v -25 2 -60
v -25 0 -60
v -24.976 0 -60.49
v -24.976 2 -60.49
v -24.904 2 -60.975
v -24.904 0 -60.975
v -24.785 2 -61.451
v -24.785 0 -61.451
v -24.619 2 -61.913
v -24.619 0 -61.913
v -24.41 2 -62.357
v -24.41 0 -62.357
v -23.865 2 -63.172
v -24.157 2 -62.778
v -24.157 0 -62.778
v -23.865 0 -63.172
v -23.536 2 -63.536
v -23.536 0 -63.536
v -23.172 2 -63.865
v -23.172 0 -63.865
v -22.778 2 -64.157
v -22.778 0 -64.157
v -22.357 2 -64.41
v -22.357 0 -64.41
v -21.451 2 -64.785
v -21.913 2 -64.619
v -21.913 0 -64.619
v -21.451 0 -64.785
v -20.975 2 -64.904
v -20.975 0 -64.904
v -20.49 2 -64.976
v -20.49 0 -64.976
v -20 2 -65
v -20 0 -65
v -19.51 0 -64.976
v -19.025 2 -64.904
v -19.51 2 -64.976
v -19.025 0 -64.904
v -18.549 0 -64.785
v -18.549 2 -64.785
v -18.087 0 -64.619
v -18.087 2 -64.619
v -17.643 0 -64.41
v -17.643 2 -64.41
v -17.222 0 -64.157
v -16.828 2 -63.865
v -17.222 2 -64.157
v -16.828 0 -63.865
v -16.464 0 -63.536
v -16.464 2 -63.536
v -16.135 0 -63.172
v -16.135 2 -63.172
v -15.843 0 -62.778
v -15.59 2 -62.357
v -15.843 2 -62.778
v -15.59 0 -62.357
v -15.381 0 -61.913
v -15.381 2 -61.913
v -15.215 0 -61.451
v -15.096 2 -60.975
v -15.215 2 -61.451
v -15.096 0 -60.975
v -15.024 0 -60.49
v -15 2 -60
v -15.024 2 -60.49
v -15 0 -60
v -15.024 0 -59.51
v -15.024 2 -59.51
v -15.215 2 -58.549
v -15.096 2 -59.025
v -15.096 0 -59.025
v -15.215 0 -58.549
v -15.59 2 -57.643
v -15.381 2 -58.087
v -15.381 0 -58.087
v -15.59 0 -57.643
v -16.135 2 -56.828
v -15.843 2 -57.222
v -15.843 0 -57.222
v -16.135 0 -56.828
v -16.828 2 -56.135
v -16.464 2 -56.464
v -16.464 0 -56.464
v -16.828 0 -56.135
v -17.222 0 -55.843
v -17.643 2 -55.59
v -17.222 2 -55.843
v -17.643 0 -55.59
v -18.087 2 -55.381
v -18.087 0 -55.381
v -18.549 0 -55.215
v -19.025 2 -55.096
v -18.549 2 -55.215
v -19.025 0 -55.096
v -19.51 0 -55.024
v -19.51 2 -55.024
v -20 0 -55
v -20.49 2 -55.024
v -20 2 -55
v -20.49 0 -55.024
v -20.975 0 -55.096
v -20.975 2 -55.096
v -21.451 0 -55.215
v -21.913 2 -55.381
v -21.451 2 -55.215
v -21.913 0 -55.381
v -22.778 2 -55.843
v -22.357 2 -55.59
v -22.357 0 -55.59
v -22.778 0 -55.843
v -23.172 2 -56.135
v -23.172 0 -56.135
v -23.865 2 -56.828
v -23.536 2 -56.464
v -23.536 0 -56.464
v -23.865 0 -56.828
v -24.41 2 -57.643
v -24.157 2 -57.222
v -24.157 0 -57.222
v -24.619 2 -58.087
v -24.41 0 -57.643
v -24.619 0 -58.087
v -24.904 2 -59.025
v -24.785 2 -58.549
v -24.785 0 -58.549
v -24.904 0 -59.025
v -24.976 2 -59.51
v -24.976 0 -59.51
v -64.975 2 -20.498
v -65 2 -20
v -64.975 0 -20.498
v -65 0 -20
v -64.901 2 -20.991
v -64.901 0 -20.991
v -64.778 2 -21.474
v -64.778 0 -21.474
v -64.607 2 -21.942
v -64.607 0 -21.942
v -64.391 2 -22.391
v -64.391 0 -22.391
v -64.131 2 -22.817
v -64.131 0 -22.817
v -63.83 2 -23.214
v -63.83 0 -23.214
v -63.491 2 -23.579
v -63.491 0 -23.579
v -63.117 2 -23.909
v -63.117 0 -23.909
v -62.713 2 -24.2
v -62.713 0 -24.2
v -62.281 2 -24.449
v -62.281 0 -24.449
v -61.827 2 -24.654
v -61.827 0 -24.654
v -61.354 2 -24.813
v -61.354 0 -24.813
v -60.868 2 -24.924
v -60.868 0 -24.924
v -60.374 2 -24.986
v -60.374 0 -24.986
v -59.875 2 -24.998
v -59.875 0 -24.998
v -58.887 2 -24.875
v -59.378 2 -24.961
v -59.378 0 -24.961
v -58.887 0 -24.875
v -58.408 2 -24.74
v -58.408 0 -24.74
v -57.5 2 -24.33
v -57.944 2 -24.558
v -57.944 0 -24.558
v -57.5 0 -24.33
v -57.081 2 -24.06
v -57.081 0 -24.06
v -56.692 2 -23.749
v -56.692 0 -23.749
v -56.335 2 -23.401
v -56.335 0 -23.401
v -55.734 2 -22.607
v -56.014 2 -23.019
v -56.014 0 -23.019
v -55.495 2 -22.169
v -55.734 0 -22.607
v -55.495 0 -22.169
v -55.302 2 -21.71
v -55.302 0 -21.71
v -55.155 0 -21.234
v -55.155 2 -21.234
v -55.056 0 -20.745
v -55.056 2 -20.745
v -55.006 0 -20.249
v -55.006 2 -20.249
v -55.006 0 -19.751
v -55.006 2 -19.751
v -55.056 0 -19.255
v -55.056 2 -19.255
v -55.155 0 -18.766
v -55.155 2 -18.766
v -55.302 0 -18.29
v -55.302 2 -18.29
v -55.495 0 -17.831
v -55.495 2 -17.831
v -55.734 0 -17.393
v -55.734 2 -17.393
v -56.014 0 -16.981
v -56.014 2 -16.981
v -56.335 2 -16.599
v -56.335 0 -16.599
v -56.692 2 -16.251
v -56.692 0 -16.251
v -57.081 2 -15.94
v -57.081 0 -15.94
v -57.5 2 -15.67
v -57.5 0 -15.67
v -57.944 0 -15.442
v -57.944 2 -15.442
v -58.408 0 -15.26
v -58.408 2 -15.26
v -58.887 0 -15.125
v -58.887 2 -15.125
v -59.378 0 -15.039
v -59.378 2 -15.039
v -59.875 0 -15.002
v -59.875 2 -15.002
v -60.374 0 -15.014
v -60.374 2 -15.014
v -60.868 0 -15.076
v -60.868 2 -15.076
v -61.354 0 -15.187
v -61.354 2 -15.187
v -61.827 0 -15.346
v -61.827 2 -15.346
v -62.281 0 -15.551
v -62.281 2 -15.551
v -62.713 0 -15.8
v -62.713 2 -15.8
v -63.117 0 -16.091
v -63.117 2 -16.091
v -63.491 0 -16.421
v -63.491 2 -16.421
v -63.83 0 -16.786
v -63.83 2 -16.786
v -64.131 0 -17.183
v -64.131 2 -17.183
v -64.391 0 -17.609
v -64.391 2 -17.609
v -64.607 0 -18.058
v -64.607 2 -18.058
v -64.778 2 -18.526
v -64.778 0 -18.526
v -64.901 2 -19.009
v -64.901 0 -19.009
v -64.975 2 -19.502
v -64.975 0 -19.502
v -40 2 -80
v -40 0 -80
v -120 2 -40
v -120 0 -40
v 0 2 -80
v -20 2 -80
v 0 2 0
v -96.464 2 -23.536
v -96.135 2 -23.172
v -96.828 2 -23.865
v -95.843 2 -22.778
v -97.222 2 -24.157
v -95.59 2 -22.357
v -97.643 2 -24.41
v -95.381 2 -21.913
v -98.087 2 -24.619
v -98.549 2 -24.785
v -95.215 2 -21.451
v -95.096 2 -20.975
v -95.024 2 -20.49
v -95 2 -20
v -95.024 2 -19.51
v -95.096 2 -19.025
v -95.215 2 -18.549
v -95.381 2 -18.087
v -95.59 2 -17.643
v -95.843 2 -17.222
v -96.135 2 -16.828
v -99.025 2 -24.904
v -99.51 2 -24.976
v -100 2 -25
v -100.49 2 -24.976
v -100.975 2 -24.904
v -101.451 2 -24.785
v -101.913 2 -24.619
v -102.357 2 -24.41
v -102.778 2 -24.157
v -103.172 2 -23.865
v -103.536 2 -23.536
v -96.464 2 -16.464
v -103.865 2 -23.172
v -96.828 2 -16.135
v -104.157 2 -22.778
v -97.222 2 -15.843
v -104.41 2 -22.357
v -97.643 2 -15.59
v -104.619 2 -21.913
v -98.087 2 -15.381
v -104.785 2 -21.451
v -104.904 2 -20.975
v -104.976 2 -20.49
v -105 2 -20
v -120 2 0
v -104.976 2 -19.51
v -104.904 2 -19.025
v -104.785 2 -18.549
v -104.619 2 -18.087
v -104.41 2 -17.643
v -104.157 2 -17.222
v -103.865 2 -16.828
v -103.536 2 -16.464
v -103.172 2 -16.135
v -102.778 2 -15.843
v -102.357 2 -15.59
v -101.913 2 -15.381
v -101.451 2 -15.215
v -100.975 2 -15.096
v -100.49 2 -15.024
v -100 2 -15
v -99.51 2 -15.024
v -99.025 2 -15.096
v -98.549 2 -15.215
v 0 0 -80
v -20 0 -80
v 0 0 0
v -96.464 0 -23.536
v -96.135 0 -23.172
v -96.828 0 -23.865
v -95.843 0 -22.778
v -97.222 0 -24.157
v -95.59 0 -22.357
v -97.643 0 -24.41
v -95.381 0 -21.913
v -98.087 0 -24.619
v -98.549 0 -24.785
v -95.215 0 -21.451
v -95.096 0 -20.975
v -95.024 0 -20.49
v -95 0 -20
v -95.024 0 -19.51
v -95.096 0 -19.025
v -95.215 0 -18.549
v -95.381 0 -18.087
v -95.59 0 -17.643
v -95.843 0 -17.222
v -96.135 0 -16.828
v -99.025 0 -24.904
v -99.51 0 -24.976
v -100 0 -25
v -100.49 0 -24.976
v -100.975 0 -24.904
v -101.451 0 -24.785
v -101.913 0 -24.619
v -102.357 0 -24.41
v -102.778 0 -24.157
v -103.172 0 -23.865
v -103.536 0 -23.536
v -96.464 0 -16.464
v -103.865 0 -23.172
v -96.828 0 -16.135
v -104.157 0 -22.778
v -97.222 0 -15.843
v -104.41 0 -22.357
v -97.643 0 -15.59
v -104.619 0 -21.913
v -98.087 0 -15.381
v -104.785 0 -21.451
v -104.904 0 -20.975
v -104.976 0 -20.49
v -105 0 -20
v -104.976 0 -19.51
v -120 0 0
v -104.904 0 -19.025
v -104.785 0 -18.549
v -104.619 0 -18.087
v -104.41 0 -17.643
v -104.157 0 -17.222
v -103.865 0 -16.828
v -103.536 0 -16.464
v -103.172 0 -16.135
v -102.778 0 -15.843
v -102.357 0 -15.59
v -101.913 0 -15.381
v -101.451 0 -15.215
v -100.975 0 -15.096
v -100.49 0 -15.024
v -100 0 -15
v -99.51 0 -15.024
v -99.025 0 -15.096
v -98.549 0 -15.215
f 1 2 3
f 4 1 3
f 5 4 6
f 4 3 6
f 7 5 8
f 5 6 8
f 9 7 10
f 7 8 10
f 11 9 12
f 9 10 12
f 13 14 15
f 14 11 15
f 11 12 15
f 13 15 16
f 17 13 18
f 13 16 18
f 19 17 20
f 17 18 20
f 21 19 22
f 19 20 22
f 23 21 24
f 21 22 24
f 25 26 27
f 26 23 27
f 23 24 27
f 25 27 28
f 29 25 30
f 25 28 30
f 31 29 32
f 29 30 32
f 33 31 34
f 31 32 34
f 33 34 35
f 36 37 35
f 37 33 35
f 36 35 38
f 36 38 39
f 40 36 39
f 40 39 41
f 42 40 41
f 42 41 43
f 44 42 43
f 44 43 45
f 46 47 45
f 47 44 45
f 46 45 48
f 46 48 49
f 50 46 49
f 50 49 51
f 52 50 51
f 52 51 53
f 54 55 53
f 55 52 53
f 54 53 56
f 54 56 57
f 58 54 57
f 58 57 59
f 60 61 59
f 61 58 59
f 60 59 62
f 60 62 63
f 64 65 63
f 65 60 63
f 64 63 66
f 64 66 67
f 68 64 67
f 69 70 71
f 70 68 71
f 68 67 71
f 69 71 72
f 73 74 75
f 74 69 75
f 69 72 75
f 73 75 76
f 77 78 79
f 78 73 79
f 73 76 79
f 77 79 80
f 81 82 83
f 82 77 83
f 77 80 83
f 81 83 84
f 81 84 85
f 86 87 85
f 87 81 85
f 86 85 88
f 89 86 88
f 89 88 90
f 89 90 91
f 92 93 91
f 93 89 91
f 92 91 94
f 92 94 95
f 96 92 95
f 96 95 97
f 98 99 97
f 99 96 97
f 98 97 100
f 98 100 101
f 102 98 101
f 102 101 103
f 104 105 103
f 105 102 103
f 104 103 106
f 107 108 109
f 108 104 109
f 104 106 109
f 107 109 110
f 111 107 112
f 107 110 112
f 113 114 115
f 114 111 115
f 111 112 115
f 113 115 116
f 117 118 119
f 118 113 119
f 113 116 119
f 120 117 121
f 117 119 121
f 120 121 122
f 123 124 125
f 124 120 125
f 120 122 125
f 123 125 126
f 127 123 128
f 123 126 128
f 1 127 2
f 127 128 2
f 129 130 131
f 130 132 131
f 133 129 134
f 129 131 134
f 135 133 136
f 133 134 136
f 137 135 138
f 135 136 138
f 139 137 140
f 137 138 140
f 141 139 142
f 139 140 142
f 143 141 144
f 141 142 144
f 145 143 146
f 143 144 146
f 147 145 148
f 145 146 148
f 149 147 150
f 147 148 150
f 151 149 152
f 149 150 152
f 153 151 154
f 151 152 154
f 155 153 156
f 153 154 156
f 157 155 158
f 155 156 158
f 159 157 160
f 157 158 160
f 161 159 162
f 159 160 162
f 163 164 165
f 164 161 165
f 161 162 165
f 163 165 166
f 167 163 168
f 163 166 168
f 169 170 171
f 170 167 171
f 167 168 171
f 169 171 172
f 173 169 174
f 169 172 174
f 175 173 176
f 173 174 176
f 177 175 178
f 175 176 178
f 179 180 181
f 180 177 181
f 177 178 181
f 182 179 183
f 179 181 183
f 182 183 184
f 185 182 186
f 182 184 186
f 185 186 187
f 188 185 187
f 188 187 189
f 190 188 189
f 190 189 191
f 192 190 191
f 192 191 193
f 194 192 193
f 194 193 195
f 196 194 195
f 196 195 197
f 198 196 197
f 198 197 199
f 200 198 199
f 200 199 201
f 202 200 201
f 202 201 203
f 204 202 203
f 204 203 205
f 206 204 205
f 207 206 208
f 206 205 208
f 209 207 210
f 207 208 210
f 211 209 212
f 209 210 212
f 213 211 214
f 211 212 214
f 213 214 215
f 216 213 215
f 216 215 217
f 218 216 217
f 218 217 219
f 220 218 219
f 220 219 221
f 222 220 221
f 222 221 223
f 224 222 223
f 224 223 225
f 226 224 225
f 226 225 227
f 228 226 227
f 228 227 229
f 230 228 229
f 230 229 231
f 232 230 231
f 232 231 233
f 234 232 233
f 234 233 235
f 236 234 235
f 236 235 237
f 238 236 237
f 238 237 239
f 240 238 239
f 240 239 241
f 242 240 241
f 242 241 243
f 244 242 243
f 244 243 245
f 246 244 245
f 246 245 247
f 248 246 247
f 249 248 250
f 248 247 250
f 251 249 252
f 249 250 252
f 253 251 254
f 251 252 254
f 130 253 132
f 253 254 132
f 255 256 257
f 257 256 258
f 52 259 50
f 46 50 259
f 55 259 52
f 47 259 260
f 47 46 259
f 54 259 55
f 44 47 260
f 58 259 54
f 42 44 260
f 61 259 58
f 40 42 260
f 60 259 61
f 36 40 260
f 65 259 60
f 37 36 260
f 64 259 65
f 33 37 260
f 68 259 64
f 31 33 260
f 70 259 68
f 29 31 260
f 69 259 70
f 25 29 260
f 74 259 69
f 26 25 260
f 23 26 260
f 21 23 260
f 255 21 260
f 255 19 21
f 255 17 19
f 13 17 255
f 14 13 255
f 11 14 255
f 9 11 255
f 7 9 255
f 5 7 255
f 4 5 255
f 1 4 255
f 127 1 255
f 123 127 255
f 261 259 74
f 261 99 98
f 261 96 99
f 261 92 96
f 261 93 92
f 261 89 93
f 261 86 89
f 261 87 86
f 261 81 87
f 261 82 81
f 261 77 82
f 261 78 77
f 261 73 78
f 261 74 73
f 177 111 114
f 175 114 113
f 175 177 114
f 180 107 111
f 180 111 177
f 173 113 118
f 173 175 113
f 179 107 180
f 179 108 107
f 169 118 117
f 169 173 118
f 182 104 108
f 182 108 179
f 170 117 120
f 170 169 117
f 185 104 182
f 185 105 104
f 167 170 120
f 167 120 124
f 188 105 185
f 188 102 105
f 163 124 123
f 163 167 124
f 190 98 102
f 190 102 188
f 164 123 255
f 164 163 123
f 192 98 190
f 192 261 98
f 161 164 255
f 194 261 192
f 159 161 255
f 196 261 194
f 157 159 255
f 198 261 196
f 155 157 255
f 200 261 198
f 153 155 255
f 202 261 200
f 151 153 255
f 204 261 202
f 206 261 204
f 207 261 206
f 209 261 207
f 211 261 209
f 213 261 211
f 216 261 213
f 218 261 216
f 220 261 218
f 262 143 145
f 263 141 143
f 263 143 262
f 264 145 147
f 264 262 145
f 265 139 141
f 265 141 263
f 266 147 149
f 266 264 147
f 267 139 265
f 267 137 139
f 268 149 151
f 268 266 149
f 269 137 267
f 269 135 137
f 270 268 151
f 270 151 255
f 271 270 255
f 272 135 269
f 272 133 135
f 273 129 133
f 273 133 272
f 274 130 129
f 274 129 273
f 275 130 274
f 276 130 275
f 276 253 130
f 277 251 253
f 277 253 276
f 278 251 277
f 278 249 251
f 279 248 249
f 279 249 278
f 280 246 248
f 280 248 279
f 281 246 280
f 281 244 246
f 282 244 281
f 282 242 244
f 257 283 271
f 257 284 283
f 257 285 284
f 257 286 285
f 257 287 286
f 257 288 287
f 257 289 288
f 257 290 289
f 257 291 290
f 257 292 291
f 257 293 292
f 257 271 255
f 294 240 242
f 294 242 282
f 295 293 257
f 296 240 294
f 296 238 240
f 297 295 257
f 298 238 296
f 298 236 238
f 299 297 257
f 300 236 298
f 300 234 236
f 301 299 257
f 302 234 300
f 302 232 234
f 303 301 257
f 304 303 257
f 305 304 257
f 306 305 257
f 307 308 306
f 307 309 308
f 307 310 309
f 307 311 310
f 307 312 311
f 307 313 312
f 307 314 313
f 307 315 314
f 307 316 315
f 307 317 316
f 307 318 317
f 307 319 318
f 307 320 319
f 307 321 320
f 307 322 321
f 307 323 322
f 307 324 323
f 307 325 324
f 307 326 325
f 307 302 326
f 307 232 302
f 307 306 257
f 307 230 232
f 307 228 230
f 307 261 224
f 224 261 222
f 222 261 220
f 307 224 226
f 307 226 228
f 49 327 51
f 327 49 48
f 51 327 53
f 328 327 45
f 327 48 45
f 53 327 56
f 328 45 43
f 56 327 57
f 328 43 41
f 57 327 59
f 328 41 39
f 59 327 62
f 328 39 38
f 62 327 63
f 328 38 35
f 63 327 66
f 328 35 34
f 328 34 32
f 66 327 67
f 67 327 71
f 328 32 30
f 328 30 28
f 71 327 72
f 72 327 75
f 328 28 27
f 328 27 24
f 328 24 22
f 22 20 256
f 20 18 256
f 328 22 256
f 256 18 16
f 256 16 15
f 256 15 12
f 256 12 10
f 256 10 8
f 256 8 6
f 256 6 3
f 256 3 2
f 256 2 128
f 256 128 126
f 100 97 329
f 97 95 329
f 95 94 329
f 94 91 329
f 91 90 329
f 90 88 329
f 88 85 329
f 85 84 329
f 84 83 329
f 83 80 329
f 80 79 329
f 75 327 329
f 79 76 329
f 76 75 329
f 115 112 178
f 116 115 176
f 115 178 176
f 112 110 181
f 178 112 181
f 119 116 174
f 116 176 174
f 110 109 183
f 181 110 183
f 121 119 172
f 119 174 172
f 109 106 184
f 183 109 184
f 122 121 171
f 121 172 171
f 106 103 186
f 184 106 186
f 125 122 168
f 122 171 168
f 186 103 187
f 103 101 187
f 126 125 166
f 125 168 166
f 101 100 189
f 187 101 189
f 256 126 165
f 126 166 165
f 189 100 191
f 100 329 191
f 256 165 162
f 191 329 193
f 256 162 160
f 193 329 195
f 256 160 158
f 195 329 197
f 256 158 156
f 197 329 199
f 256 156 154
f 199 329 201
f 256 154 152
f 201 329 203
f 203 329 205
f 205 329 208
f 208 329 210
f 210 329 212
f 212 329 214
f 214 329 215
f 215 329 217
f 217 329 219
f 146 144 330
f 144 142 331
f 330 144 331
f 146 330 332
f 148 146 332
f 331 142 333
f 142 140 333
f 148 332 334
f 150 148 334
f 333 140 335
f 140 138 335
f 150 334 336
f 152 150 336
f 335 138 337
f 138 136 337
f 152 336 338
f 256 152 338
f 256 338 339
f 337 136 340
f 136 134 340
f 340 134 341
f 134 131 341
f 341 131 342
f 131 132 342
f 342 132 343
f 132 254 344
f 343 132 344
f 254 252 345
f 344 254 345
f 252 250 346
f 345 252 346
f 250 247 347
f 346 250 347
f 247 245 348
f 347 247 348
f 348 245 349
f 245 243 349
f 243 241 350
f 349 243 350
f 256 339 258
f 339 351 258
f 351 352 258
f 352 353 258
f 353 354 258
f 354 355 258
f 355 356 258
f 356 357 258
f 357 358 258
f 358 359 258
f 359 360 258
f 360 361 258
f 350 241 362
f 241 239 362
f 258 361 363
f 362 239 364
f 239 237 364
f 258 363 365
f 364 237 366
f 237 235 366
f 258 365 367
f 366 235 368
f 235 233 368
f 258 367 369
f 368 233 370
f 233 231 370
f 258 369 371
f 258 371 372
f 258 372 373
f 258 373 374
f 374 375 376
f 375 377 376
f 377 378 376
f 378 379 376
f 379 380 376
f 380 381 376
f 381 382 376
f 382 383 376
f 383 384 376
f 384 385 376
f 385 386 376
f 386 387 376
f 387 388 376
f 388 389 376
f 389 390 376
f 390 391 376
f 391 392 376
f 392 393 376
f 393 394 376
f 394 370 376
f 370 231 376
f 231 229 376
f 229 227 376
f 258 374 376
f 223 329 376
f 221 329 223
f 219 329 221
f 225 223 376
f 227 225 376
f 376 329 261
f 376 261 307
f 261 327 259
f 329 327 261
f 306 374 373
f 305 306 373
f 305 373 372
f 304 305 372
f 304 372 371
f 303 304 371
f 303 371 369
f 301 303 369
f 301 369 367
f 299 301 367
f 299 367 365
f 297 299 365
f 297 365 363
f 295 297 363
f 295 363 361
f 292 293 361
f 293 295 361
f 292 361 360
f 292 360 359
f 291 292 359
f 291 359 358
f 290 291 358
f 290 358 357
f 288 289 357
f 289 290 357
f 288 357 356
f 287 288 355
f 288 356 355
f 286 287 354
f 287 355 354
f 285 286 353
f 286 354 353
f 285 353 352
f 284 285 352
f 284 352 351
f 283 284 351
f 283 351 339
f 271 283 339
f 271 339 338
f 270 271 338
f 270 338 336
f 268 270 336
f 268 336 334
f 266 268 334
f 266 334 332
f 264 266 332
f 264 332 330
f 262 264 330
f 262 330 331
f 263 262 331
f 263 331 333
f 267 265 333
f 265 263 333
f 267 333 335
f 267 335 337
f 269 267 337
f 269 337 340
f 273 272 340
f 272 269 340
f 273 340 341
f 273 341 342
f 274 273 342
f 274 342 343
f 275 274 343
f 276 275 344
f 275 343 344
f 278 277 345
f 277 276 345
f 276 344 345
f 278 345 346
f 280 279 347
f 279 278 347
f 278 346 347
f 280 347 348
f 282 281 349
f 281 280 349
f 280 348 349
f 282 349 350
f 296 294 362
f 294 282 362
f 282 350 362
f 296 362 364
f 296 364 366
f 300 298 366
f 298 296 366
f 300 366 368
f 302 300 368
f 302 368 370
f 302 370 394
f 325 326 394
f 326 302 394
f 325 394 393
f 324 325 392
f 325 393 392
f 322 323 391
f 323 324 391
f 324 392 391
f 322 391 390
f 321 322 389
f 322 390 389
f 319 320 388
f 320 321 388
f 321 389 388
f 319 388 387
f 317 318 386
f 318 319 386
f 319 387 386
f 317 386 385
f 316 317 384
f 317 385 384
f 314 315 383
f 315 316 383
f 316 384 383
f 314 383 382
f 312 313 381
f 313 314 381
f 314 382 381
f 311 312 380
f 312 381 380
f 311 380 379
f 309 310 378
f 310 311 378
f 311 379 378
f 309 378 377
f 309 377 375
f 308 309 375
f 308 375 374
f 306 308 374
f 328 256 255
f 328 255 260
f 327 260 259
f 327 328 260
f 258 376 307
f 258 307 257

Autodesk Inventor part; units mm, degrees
ref_plane "YZ Plane" through (0, 0, 0) normal (1, 0, 0) x (0, 1, 0)
ref_plane "XZ Plane" through (0, 0, 0) normal (0, 1, 0) x (-1, 0, 0)
ref_plane "XY Plane" through (0, 0, 0) normal (0, 0, 1) x (1, 0, 0)
sketch "Эскиз1" plane through (0, 0, 0) normal (0, 1, 0) x (-1, 0, 0)
  line L0 (0, 0) -> (80, 0)
  line L1 (80, 0) -> (80, -80)
  line L2 (80, -80) -> (0, -80)
  line L3 (0, -80) -> (0, 0)
  line L4 (80, 0) -> (80, -40)
  line L5 (80, -20) -> (60, -20)
  line L6 (40, -80) -> (0, -80)
  line L7 (20, -80) -> (20, -60)
  circle A0 centre (60, -20) radius 5
  circle A1 centre (20, -60) radius 5
  line L8 (80, 0) -> (120, 0)
  line L9 (120, 0) -> (120, -40)
  line L10 (120, -40) -> (80, -40)
  line L11 (80, -40) -> (80, 0)
  line L12 (0, -80) -> (40, -80)
  line L13 (40, -80) -> (120, -40)
  line L14 (80, -20) -> (100, -20)
  circle A2 centre (100, -20) radius 5
  dimension "d0" = 80
  dimension "d1" = 80
  dimension "d2" = 40
  dimension "d3" = 20
  dimension "d4" = 20
  dimension "d5" = 10
  dimension "d6" = 10
  dimension "d7" = 40
  dimension "d8" = 40
  dimension "d9" = 40
  dimension "d10" = 10
extrude "Выдавливание1" add sketch "Эскиз1" along normal blind 2 contours L0 L1 L13 L2 L3 | L8 L9 L10 L1 | L10 L13 L1
properties part number "Угол 80х40"
